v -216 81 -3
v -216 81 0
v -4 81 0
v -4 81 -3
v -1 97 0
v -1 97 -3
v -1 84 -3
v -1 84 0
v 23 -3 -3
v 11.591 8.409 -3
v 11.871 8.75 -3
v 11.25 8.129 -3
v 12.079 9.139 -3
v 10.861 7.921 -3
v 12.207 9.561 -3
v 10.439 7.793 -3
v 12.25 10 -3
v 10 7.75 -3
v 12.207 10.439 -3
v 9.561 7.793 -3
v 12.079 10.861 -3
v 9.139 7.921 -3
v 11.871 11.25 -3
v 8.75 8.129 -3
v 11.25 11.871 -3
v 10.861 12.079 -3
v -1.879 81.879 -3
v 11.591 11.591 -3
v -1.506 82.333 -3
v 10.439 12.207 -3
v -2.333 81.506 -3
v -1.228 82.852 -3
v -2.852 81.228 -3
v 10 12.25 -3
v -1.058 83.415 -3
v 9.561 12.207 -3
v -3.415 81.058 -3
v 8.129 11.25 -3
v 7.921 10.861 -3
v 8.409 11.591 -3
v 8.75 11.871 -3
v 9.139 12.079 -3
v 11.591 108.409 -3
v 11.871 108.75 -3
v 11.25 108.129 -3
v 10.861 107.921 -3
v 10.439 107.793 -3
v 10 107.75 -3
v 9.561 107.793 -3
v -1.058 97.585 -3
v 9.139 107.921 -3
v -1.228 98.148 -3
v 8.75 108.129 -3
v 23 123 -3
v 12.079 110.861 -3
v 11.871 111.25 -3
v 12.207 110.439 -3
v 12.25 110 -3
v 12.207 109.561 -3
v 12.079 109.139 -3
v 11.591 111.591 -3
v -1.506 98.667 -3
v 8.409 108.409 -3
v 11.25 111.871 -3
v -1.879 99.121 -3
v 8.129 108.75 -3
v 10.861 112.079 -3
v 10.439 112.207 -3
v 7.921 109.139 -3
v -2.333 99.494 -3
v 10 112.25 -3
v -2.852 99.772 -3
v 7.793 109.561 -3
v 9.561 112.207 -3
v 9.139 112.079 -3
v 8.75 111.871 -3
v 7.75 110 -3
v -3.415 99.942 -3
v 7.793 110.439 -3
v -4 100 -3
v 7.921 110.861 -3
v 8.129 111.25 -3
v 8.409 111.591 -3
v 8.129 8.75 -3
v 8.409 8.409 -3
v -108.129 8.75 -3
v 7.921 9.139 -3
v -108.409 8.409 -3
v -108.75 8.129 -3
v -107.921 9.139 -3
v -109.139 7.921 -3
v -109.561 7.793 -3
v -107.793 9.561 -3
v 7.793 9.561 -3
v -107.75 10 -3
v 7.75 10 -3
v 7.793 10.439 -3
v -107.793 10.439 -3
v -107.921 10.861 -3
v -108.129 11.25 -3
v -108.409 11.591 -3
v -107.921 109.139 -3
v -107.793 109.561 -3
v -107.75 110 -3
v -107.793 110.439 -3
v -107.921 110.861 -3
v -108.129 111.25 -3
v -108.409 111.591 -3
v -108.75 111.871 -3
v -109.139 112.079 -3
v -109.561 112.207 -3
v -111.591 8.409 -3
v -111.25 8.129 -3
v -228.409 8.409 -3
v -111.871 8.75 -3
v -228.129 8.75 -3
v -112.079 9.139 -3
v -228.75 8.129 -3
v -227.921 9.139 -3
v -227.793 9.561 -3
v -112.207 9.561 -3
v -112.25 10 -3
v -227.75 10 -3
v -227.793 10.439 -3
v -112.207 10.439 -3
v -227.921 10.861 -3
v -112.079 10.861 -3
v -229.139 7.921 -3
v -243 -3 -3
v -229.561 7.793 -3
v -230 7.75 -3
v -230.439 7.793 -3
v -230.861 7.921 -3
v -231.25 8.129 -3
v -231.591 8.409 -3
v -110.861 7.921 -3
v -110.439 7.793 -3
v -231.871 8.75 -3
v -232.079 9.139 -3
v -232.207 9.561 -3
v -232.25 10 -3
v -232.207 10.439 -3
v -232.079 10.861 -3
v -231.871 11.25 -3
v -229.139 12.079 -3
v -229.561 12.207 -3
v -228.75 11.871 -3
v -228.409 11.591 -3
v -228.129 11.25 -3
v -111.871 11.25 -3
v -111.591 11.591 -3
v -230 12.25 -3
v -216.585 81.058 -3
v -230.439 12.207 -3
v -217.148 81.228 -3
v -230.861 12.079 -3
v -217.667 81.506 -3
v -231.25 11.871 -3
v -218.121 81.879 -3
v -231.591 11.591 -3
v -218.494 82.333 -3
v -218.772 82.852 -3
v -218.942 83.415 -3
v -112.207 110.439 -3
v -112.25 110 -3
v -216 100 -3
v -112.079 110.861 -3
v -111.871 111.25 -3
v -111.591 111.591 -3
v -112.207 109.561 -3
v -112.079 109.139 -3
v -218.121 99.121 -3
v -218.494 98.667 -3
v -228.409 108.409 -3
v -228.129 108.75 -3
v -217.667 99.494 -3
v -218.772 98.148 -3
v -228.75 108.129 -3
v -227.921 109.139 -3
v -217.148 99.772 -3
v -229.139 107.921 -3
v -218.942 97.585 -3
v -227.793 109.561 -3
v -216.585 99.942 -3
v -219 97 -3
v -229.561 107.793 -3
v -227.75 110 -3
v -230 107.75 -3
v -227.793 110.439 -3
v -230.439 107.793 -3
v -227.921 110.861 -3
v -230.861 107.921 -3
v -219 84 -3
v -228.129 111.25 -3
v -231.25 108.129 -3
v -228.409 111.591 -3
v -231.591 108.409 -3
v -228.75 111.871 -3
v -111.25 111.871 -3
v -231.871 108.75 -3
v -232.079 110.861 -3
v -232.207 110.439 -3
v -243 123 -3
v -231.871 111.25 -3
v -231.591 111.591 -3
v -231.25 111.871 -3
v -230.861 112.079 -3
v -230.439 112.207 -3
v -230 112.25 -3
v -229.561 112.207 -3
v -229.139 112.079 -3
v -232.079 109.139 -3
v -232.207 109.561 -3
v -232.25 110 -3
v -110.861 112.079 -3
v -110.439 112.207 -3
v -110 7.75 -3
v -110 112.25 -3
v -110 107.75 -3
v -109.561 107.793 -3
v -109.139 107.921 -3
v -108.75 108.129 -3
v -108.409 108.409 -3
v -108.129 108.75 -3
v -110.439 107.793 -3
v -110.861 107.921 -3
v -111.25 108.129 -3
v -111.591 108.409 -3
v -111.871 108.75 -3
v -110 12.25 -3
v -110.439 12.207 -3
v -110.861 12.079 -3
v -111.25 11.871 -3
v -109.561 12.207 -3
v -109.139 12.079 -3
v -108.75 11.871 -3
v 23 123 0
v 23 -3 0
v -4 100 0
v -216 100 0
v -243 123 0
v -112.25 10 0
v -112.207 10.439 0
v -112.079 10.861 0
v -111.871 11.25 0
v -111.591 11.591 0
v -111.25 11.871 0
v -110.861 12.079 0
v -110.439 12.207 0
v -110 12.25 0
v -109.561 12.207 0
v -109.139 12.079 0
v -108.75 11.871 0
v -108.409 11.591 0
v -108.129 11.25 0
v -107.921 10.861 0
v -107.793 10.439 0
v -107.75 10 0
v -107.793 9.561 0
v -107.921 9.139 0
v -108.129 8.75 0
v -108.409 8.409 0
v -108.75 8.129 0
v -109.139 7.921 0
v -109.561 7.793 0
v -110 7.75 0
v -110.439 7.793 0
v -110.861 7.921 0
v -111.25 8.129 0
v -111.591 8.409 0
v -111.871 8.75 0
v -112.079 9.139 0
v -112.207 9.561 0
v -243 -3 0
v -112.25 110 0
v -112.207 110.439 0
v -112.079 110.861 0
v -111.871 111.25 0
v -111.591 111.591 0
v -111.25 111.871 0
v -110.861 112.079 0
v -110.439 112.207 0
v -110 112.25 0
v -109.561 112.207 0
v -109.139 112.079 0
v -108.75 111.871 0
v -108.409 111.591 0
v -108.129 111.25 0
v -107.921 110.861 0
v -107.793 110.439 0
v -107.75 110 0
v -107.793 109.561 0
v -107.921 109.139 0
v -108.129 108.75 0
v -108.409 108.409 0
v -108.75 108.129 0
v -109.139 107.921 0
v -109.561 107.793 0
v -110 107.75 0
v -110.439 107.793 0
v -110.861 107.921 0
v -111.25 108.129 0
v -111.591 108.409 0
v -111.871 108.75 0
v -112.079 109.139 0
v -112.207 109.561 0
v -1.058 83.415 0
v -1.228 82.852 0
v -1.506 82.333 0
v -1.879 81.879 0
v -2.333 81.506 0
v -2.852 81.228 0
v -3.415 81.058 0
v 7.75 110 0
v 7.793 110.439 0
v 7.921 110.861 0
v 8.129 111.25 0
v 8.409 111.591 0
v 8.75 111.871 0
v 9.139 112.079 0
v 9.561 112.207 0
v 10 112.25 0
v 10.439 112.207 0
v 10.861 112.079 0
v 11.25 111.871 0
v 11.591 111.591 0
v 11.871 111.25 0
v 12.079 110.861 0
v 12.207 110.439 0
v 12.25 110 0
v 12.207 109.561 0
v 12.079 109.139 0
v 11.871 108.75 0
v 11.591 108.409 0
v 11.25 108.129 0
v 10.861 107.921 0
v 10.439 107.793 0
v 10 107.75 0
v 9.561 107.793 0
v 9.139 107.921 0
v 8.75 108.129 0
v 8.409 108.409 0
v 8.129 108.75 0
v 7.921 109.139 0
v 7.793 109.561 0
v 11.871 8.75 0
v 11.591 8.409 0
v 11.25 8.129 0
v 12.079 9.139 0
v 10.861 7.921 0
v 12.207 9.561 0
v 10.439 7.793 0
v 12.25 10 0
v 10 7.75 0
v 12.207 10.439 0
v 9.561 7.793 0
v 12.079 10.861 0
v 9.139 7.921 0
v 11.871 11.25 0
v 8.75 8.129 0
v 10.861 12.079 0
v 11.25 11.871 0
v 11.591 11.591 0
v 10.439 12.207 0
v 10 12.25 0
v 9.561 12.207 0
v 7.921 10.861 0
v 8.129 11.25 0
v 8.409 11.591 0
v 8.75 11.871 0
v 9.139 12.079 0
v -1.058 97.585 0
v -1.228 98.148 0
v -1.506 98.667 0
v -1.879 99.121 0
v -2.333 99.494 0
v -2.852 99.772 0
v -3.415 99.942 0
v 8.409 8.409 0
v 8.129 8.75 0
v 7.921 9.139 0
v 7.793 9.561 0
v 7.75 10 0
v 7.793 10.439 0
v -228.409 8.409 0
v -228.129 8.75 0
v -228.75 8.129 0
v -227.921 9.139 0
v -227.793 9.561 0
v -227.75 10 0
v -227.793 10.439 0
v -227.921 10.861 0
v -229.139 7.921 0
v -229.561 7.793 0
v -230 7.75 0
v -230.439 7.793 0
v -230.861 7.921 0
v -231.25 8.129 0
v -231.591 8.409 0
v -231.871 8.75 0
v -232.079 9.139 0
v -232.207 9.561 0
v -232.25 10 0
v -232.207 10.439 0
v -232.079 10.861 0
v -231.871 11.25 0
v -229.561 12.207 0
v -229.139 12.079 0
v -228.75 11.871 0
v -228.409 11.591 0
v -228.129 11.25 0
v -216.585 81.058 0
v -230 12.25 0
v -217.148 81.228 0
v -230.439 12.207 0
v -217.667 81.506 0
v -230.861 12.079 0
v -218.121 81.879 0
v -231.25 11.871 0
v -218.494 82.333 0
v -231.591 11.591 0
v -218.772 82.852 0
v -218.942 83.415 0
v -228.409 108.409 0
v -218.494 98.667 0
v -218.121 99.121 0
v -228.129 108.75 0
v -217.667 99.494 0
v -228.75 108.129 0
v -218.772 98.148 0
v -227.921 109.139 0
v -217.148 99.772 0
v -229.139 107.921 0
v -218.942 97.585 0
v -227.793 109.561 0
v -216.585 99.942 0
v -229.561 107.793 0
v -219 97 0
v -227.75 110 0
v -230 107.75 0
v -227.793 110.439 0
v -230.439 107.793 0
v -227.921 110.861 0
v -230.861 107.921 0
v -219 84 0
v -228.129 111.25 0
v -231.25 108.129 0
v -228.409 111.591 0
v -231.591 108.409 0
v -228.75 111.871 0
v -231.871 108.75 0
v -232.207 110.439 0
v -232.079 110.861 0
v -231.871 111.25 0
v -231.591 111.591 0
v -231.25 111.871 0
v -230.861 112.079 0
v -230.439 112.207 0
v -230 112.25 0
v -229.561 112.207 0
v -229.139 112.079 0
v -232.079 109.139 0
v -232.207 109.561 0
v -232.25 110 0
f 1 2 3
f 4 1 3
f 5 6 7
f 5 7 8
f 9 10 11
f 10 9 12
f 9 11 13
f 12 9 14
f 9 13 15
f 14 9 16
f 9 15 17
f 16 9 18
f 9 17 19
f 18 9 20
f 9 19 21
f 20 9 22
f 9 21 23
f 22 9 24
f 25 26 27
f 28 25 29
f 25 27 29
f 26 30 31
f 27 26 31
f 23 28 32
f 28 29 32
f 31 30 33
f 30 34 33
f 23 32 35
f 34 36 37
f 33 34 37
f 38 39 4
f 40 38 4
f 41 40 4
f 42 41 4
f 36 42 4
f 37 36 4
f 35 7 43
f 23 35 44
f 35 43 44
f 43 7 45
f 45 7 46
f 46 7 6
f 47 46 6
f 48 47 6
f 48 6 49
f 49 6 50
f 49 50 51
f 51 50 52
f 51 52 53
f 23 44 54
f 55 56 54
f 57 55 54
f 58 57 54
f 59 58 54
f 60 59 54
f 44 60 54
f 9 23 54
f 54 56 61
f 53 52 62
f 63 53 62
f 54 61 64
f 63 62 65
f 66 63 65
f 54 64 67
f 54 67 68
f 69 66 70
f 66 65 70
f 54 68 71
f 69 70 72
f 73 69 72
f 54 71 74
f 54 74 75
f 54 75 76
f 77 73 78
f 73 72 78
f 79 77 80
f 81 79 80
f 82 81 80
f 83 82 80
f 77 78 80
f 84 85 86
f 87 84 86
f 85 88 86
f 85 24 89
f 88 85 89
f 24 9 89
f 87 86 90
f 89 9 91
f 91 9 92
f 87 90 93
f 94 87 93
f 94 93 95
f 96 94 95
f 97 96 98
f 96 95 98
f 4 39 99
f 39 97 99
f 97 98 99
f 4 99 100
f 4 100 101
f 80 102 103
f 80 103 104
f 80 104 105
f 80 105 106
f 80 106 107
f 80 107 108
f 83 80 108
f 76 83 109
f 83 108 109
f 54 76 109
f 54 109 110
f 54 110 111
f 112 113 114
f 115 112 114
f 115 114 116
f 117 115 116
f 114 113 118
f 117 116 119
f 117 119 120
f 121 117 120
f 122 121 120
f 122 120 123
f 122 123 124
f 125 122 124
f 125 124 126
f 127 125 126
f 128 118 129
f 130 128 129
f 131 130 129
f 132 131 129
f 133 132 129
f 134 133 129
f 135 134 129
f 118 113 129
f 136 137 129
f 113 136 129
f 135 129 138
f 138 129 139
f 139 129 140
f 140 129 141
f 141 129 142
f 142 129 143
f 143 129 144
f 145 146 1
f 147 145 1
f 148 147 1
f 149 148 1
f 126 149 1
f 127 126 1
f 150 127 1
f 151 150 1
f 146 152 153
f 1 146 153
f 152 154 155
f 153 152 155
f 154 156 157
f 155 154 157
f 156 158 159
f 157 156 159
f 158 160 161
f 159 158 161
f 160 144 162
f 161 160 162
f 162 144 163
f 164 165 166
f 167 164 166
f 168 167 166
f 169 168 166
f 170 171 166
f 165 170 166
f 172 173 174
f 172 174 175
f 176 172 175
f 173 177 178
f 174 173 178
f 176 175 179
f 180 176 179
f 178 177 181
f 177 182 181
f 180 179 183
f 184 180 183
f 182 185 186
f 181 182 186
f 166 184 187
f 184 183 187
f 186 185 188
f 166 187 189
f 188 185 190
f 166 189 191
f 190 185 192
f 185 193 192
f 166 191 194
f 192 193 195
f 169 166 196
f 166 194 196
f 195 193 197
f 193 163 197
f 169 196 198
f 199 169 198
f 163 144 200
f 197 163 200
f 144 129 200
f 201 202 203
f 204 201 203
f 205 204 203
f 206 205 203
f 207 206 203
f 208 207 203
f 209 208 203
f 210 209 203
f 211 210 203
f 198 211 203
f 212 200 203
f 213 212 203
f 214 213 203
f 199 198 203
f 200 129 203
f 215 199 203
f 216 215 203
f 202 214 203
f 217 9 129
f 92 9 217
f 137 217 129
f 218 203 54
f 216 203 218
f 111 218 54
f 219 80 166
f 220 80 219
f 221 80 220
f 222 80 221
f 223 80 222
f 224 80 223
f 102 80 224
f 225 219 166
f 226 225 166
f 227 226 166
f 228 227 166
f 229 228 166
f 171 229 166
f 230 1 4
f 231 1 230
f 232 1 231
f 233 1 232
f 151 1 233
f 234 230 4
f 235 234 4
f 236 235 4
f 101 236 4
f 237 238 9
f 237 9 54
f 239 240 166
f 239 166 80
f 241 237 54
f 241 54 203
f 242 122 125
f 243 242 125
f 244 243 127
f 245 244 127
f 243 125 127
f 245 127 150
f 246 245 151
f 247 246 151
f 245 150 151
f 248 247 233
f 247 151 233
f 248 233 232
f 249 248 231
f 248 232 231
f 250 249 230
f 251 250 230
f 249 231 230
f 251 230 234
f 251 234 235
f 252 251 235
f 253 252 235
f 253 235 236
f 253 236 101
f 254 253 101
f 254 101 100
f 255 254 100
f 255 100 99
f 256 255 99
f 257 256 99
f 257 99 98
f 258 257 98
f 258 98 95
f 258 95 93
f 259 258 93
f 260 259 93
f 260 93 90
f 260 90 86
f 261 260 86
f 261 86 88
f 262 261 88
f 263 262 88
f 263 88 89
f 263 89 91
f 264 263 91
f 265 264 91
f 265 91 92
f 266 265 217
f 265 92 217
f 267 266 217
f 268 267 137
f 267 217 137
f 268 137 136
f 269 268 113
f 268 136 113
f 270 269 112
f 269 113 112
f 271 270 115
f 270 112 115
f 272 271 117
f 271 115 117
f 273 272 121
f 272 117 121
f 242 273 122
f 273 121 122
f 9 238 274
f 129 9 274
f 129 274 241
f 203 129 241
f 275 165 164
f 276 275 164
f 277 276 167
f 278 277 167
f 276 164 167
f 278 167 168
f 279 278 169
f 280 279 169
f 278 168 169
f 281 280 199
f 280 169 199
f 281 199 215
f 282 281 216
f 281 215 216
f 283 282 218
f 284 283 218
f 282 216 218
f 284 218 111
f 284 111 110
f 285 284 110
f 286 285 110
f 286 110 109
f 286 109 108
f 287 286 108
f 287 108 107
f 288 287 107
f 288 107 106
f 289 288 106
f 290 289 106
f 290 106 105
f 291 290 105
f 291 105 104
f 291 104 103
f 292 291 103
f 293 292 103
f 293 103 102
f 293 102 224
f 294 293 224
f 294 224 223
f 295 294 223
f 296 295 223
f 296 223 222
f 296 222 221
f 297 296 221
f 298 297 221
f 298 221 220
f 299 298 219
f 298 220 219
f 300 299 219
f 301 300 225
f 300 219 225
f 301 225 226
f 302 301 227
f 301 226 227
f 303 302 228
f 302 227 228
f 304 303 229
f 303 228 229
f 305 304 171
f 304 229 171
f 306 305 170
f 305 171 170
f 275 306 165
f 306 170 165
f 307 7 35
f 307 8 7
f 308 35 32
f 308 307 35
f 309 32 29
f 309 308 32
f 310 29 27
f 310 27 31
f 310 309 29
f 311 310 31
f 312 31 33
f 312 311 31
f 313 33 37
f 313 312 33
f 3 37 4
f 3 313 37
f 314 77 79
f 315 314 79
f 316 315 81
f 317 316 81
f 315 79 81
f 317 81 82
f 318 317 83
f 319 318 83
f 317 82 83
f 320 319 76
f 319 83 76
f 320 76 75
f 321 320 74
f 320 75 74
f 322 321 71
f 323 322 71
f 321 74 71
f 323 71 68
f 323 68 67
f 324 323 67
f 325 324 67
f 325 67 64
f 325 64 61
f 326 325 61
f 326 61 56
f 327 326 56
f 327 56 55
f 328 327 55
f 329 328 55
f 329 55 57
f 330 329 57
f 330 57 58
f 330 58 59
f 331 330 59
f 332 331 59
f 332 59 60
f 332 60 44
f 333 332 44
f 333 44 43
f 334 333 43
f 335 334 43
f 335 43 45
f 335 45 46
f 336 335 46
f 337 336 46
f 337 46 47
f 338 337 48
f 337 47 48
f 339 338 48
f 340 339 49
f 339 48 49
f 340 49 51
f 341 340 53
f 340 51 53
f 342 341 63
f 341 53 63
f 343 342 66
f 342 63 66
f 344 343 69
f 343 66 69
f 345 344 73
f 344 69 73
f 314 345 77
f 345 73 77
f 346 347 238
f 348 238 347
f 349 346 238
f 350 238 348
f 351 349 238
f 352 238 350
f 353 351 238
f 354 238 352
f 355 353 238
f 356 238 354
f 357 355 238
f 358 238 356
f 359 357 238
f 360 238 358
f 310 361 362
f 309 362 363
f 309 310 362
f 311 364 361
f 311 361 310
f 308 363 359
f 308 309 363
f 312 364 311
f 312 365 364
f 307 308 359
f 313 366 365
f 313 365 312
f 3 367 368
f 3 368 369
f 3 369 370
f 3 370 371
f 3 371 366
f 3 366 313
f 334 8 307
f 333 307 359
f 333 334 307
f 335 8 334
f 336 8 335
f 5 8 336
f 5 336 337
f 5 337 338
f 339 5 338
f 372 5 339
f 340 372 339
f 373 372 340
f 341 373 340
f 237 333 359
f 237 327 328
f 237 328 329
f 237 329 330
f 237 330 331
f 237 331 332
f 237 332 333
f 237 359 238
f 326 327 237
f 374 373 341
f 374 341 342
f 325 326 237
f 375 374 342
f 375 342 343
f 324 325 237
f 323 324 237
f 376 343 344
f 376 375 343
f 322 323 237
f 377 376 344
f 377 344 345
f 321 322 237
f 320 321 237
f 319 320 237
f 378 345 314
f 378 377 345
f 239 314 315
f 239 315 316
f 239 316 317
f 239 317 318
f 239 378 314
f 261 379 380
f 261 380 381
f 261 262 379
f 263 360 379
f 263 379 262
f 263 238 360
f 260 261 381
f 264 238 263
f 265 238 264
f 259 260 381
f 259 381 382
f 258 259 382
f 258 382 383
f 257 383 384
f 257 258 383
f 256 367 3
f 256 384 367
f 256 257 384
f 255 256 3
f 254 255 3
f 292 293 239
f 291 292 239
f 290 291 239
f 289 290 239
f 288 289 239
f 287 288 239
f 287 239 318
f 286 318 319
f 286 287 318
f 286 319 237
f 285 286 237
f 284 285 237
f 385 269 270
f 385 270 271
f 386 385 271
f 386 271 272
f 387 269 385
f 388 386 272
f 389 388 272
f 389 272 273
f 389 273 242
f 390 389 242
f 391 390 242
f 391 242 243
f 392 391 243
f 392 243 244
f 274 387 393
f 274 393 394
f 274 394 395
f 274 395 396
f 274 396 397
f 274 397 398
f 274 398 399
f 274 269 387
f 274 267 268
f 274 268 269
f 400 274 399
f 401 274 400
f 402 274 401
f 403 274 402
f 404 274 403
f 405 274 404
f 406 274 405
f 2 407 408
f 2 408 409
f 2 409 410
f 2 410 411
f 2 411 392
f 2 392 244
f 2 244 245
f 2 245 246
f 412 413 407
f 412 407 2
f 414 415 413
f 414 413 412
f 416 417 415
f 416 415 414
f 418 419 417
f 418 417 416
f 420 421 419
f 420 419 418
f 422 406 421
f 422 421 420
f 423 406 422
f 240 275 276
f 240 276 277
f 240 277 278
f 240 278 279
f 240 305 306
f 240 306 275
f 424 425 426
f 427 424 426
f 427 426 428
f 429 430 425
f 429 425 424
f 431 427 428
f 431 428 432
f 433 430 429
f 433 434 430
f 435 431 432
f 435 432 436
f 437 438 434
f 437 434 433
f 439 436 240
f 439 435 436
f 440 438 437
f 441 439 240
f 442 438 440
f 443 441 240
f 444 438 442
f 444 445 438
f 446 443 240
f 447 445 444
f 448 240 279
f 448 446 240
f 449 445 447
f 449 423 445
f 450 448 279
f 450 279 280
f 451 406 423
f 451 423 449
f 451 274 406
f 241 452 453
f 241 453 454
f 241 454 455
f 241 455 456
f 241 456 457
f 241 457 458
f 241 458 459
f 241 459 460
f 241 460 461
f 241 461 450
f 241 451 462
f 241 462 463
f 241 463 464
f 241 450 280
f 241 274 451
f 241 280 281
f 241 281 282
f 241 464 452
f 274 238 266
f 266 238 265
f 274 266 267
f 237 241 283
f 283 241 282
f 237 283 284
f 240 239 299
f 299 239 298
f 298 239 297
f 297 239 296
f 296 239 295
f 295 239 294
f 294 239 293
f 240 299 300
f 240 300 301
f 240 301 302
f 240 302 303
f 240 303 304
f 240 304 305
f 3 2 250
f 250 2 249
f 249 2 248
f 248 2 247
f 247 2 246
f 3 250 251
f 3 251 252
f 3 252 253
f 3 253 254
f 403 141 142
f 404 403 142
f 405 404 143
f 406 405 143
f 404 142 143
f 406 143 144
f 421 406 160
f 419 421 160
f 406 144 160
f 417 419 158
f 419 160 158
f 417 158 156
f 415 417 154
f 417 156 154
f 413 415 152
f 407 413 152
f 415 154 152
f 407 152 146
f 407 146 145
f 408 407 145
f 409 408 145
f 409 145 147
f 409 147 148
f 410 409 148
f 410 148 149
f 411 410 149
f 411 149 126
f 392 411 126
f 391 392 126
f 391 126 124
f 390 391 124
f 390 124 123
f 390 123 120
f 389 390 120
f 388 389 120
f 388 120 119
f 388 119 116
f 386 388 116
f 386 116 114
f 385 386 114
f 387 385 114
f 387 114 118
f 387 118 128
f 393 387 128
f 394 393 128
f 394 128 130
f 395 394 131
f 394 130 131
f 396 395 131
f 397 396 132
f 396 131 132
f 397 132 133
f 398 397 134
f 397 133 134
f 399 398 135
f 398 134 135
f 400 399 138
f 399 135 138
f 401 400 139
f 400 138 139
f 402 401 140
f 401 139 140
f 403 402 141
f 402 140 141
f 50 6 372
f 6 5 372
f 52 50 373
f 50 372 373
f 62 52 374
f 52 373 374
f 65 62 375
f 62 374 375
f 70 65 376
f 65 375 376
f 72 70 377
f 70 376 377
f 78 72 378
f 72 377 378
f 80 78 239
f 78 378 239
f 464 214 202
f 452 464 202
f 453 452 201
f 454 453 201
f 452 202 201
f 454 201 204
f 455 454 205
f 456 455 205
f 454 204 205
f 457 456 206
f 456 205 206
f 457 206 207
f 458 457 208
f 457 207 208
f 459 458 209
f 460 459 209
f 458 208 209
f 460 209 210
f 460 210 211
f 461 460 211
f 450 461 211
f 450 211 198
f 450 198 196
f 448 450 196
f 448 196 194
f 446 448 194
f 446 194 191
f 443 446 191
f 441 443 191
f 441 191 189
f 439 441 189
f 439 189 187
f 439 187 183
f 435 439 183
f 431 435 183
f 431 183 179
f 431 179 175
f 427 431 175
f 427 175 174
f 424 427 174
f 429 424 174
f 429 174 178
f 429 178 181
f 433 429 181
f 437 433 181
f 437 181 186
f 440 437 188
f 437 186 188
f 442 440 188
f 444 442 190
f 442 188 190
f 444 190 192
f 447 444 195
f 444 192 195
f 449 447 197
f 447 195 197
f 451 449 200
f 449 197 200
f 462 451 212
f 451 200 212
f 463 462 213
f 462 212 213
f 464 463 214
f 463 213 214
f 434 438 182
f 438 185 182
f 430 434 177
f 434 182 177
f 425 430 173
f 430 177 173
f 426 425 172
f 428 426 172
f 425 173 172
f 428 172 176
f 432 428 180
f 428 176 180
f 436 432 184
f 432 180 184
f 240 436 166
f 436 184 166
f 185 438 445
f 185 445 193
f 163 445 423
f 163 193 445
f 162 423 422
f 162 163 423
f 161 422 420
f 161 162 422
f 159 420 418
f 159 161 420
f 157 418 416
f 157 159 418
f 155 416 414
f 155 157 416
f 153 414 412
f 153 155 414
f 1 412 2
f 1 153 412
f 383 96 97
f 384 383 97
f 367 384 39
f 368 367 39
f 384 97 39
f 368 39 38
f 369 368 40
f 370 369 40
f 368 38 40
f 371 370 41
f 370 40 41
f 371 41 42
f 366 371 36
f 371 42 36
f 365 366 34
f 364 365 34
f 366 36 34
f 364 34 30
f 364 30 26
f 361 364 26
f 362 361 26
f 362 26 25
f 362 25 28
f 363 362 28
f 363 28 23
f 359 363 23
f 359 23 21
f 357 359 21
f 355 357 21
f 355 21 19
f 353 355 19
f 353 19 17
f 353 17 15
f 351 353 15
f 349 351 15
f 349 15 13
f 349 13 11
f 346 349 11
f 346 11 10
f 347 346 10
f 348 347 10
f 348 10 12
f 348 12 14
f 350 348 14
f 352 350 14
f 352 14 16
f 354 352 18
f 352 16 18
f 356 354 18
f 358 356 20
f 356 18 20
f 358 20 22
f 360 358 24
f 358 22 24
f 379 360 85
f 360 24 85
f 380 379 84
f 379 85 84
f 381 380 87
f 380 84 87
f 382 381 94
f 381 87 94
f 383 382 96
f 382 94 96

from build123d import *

# Parameters (mm, degrees)
SKETCH_1_W          = 266
SKETCH_1_H          = 126
EXTRUDE_1_DEPTH     = 3
SKETCH_2_W          = 220
SKETCH_2_H          = 19
CUT_EXTRUDE_1_DEPTH = 4
SKETCH_3_W          = 3
SKETCH_3_H          = 19
EXTRUDE_2_DEPTH     = 1
SKETCH_4_W          = 3
SKETCH_4_H          = 19
EXTRUDE_3_DEPTH     = 1
FILLET_1_R          = 3
SKETCH_5_R          = 2.25
CUT_EXTRUDE_2_DEPTH = 4


with BuildPart() as part:
    # Эскиз1 → Бобышка-Вытянуть1 (new body)
    with BuildSketch(Plane(origin=(0, 0, 0), x_dir=(-1, 0, 0), z_dir=(0, 0, -1))):
        with Locations((110, 60)):
            Rectangle(SKETCH_1_W, SKETCH_1_H)
    extrude(amount=EXTRUDE_1_DEPTH)

    # Эскиз2 → Вырез-Вытянуть1 (cut, through all)
    with BuildSketch(Plane.XY):
        with Locations((-110, 90.5)):
            Rectangle(SKETCH_2_W, SKETCH_2_H)
    extrude(amount=-CUT_EXTRUDE_1_DEPTH, mode=Mode.SUBTRACT)

    # Эскиз3 → Бобышка-Вытянуть2 (add)
    with BuildSketch(Plane.ZY):
        with Locations((-1.5, 90.5)):
            Rectangle(SKETCH_3_W, SKETCH_3_H)
    extrude(amount=EXTRUDE_2_DEPTH)

    # Эскиз4 → Бобышка-Вытянуть3 (add)
    with BuildSketch(Plane(origin=(-220, 0, 0), x_dir=(0, 0, -1), z_dir=(1, 0, 0))):
        with Locations((1.5, 90.5)):
            Rectangle(SKETCH_4_W, SKETCH_4_H)
    extrude(amount=EXTRUDE_3_DEPTH)

    # Скругление1
    fillet_1_edges = [part.edges().sort_by_distance(p)[0] for p in [
        (-1, 81, -1.5),
        (-1, 100, -1.5),
        (-219, 100, -1.5),
        (-219, 81, -1.5),
    ]]
    fillet(fillet_1_edges, radius=FILLET_1_R)

    # Эскиз5 → Вырез-Вытянуть2 (cut, through all)
    with BuildSketch(Plane(origin=(0, 0, -3), x_dir=(-1, 0, 0), z_dir=(0, 0, -1))):
        with Locations((230, 110)):
            Circle(SKETCH_5_R)
        with Locations((110, 110)):
            Circle(SKETCH_5_R)
        with Locations((-10, 110)):
            Circle(SKETCH_5_R)
        with Locations((-10, 10)):
            Circle(SKETCH_5_R)
        with Locations((110, 10)):
            Circle(SKETCH_5_R)
        with Locations((230, 10)):
            Circle(SKETCH_5_R)
    extrude(amount=-CUT_EXTRUDE_2_DEPTH, mode=Mode.SUBTRACT)


solid = part.part
